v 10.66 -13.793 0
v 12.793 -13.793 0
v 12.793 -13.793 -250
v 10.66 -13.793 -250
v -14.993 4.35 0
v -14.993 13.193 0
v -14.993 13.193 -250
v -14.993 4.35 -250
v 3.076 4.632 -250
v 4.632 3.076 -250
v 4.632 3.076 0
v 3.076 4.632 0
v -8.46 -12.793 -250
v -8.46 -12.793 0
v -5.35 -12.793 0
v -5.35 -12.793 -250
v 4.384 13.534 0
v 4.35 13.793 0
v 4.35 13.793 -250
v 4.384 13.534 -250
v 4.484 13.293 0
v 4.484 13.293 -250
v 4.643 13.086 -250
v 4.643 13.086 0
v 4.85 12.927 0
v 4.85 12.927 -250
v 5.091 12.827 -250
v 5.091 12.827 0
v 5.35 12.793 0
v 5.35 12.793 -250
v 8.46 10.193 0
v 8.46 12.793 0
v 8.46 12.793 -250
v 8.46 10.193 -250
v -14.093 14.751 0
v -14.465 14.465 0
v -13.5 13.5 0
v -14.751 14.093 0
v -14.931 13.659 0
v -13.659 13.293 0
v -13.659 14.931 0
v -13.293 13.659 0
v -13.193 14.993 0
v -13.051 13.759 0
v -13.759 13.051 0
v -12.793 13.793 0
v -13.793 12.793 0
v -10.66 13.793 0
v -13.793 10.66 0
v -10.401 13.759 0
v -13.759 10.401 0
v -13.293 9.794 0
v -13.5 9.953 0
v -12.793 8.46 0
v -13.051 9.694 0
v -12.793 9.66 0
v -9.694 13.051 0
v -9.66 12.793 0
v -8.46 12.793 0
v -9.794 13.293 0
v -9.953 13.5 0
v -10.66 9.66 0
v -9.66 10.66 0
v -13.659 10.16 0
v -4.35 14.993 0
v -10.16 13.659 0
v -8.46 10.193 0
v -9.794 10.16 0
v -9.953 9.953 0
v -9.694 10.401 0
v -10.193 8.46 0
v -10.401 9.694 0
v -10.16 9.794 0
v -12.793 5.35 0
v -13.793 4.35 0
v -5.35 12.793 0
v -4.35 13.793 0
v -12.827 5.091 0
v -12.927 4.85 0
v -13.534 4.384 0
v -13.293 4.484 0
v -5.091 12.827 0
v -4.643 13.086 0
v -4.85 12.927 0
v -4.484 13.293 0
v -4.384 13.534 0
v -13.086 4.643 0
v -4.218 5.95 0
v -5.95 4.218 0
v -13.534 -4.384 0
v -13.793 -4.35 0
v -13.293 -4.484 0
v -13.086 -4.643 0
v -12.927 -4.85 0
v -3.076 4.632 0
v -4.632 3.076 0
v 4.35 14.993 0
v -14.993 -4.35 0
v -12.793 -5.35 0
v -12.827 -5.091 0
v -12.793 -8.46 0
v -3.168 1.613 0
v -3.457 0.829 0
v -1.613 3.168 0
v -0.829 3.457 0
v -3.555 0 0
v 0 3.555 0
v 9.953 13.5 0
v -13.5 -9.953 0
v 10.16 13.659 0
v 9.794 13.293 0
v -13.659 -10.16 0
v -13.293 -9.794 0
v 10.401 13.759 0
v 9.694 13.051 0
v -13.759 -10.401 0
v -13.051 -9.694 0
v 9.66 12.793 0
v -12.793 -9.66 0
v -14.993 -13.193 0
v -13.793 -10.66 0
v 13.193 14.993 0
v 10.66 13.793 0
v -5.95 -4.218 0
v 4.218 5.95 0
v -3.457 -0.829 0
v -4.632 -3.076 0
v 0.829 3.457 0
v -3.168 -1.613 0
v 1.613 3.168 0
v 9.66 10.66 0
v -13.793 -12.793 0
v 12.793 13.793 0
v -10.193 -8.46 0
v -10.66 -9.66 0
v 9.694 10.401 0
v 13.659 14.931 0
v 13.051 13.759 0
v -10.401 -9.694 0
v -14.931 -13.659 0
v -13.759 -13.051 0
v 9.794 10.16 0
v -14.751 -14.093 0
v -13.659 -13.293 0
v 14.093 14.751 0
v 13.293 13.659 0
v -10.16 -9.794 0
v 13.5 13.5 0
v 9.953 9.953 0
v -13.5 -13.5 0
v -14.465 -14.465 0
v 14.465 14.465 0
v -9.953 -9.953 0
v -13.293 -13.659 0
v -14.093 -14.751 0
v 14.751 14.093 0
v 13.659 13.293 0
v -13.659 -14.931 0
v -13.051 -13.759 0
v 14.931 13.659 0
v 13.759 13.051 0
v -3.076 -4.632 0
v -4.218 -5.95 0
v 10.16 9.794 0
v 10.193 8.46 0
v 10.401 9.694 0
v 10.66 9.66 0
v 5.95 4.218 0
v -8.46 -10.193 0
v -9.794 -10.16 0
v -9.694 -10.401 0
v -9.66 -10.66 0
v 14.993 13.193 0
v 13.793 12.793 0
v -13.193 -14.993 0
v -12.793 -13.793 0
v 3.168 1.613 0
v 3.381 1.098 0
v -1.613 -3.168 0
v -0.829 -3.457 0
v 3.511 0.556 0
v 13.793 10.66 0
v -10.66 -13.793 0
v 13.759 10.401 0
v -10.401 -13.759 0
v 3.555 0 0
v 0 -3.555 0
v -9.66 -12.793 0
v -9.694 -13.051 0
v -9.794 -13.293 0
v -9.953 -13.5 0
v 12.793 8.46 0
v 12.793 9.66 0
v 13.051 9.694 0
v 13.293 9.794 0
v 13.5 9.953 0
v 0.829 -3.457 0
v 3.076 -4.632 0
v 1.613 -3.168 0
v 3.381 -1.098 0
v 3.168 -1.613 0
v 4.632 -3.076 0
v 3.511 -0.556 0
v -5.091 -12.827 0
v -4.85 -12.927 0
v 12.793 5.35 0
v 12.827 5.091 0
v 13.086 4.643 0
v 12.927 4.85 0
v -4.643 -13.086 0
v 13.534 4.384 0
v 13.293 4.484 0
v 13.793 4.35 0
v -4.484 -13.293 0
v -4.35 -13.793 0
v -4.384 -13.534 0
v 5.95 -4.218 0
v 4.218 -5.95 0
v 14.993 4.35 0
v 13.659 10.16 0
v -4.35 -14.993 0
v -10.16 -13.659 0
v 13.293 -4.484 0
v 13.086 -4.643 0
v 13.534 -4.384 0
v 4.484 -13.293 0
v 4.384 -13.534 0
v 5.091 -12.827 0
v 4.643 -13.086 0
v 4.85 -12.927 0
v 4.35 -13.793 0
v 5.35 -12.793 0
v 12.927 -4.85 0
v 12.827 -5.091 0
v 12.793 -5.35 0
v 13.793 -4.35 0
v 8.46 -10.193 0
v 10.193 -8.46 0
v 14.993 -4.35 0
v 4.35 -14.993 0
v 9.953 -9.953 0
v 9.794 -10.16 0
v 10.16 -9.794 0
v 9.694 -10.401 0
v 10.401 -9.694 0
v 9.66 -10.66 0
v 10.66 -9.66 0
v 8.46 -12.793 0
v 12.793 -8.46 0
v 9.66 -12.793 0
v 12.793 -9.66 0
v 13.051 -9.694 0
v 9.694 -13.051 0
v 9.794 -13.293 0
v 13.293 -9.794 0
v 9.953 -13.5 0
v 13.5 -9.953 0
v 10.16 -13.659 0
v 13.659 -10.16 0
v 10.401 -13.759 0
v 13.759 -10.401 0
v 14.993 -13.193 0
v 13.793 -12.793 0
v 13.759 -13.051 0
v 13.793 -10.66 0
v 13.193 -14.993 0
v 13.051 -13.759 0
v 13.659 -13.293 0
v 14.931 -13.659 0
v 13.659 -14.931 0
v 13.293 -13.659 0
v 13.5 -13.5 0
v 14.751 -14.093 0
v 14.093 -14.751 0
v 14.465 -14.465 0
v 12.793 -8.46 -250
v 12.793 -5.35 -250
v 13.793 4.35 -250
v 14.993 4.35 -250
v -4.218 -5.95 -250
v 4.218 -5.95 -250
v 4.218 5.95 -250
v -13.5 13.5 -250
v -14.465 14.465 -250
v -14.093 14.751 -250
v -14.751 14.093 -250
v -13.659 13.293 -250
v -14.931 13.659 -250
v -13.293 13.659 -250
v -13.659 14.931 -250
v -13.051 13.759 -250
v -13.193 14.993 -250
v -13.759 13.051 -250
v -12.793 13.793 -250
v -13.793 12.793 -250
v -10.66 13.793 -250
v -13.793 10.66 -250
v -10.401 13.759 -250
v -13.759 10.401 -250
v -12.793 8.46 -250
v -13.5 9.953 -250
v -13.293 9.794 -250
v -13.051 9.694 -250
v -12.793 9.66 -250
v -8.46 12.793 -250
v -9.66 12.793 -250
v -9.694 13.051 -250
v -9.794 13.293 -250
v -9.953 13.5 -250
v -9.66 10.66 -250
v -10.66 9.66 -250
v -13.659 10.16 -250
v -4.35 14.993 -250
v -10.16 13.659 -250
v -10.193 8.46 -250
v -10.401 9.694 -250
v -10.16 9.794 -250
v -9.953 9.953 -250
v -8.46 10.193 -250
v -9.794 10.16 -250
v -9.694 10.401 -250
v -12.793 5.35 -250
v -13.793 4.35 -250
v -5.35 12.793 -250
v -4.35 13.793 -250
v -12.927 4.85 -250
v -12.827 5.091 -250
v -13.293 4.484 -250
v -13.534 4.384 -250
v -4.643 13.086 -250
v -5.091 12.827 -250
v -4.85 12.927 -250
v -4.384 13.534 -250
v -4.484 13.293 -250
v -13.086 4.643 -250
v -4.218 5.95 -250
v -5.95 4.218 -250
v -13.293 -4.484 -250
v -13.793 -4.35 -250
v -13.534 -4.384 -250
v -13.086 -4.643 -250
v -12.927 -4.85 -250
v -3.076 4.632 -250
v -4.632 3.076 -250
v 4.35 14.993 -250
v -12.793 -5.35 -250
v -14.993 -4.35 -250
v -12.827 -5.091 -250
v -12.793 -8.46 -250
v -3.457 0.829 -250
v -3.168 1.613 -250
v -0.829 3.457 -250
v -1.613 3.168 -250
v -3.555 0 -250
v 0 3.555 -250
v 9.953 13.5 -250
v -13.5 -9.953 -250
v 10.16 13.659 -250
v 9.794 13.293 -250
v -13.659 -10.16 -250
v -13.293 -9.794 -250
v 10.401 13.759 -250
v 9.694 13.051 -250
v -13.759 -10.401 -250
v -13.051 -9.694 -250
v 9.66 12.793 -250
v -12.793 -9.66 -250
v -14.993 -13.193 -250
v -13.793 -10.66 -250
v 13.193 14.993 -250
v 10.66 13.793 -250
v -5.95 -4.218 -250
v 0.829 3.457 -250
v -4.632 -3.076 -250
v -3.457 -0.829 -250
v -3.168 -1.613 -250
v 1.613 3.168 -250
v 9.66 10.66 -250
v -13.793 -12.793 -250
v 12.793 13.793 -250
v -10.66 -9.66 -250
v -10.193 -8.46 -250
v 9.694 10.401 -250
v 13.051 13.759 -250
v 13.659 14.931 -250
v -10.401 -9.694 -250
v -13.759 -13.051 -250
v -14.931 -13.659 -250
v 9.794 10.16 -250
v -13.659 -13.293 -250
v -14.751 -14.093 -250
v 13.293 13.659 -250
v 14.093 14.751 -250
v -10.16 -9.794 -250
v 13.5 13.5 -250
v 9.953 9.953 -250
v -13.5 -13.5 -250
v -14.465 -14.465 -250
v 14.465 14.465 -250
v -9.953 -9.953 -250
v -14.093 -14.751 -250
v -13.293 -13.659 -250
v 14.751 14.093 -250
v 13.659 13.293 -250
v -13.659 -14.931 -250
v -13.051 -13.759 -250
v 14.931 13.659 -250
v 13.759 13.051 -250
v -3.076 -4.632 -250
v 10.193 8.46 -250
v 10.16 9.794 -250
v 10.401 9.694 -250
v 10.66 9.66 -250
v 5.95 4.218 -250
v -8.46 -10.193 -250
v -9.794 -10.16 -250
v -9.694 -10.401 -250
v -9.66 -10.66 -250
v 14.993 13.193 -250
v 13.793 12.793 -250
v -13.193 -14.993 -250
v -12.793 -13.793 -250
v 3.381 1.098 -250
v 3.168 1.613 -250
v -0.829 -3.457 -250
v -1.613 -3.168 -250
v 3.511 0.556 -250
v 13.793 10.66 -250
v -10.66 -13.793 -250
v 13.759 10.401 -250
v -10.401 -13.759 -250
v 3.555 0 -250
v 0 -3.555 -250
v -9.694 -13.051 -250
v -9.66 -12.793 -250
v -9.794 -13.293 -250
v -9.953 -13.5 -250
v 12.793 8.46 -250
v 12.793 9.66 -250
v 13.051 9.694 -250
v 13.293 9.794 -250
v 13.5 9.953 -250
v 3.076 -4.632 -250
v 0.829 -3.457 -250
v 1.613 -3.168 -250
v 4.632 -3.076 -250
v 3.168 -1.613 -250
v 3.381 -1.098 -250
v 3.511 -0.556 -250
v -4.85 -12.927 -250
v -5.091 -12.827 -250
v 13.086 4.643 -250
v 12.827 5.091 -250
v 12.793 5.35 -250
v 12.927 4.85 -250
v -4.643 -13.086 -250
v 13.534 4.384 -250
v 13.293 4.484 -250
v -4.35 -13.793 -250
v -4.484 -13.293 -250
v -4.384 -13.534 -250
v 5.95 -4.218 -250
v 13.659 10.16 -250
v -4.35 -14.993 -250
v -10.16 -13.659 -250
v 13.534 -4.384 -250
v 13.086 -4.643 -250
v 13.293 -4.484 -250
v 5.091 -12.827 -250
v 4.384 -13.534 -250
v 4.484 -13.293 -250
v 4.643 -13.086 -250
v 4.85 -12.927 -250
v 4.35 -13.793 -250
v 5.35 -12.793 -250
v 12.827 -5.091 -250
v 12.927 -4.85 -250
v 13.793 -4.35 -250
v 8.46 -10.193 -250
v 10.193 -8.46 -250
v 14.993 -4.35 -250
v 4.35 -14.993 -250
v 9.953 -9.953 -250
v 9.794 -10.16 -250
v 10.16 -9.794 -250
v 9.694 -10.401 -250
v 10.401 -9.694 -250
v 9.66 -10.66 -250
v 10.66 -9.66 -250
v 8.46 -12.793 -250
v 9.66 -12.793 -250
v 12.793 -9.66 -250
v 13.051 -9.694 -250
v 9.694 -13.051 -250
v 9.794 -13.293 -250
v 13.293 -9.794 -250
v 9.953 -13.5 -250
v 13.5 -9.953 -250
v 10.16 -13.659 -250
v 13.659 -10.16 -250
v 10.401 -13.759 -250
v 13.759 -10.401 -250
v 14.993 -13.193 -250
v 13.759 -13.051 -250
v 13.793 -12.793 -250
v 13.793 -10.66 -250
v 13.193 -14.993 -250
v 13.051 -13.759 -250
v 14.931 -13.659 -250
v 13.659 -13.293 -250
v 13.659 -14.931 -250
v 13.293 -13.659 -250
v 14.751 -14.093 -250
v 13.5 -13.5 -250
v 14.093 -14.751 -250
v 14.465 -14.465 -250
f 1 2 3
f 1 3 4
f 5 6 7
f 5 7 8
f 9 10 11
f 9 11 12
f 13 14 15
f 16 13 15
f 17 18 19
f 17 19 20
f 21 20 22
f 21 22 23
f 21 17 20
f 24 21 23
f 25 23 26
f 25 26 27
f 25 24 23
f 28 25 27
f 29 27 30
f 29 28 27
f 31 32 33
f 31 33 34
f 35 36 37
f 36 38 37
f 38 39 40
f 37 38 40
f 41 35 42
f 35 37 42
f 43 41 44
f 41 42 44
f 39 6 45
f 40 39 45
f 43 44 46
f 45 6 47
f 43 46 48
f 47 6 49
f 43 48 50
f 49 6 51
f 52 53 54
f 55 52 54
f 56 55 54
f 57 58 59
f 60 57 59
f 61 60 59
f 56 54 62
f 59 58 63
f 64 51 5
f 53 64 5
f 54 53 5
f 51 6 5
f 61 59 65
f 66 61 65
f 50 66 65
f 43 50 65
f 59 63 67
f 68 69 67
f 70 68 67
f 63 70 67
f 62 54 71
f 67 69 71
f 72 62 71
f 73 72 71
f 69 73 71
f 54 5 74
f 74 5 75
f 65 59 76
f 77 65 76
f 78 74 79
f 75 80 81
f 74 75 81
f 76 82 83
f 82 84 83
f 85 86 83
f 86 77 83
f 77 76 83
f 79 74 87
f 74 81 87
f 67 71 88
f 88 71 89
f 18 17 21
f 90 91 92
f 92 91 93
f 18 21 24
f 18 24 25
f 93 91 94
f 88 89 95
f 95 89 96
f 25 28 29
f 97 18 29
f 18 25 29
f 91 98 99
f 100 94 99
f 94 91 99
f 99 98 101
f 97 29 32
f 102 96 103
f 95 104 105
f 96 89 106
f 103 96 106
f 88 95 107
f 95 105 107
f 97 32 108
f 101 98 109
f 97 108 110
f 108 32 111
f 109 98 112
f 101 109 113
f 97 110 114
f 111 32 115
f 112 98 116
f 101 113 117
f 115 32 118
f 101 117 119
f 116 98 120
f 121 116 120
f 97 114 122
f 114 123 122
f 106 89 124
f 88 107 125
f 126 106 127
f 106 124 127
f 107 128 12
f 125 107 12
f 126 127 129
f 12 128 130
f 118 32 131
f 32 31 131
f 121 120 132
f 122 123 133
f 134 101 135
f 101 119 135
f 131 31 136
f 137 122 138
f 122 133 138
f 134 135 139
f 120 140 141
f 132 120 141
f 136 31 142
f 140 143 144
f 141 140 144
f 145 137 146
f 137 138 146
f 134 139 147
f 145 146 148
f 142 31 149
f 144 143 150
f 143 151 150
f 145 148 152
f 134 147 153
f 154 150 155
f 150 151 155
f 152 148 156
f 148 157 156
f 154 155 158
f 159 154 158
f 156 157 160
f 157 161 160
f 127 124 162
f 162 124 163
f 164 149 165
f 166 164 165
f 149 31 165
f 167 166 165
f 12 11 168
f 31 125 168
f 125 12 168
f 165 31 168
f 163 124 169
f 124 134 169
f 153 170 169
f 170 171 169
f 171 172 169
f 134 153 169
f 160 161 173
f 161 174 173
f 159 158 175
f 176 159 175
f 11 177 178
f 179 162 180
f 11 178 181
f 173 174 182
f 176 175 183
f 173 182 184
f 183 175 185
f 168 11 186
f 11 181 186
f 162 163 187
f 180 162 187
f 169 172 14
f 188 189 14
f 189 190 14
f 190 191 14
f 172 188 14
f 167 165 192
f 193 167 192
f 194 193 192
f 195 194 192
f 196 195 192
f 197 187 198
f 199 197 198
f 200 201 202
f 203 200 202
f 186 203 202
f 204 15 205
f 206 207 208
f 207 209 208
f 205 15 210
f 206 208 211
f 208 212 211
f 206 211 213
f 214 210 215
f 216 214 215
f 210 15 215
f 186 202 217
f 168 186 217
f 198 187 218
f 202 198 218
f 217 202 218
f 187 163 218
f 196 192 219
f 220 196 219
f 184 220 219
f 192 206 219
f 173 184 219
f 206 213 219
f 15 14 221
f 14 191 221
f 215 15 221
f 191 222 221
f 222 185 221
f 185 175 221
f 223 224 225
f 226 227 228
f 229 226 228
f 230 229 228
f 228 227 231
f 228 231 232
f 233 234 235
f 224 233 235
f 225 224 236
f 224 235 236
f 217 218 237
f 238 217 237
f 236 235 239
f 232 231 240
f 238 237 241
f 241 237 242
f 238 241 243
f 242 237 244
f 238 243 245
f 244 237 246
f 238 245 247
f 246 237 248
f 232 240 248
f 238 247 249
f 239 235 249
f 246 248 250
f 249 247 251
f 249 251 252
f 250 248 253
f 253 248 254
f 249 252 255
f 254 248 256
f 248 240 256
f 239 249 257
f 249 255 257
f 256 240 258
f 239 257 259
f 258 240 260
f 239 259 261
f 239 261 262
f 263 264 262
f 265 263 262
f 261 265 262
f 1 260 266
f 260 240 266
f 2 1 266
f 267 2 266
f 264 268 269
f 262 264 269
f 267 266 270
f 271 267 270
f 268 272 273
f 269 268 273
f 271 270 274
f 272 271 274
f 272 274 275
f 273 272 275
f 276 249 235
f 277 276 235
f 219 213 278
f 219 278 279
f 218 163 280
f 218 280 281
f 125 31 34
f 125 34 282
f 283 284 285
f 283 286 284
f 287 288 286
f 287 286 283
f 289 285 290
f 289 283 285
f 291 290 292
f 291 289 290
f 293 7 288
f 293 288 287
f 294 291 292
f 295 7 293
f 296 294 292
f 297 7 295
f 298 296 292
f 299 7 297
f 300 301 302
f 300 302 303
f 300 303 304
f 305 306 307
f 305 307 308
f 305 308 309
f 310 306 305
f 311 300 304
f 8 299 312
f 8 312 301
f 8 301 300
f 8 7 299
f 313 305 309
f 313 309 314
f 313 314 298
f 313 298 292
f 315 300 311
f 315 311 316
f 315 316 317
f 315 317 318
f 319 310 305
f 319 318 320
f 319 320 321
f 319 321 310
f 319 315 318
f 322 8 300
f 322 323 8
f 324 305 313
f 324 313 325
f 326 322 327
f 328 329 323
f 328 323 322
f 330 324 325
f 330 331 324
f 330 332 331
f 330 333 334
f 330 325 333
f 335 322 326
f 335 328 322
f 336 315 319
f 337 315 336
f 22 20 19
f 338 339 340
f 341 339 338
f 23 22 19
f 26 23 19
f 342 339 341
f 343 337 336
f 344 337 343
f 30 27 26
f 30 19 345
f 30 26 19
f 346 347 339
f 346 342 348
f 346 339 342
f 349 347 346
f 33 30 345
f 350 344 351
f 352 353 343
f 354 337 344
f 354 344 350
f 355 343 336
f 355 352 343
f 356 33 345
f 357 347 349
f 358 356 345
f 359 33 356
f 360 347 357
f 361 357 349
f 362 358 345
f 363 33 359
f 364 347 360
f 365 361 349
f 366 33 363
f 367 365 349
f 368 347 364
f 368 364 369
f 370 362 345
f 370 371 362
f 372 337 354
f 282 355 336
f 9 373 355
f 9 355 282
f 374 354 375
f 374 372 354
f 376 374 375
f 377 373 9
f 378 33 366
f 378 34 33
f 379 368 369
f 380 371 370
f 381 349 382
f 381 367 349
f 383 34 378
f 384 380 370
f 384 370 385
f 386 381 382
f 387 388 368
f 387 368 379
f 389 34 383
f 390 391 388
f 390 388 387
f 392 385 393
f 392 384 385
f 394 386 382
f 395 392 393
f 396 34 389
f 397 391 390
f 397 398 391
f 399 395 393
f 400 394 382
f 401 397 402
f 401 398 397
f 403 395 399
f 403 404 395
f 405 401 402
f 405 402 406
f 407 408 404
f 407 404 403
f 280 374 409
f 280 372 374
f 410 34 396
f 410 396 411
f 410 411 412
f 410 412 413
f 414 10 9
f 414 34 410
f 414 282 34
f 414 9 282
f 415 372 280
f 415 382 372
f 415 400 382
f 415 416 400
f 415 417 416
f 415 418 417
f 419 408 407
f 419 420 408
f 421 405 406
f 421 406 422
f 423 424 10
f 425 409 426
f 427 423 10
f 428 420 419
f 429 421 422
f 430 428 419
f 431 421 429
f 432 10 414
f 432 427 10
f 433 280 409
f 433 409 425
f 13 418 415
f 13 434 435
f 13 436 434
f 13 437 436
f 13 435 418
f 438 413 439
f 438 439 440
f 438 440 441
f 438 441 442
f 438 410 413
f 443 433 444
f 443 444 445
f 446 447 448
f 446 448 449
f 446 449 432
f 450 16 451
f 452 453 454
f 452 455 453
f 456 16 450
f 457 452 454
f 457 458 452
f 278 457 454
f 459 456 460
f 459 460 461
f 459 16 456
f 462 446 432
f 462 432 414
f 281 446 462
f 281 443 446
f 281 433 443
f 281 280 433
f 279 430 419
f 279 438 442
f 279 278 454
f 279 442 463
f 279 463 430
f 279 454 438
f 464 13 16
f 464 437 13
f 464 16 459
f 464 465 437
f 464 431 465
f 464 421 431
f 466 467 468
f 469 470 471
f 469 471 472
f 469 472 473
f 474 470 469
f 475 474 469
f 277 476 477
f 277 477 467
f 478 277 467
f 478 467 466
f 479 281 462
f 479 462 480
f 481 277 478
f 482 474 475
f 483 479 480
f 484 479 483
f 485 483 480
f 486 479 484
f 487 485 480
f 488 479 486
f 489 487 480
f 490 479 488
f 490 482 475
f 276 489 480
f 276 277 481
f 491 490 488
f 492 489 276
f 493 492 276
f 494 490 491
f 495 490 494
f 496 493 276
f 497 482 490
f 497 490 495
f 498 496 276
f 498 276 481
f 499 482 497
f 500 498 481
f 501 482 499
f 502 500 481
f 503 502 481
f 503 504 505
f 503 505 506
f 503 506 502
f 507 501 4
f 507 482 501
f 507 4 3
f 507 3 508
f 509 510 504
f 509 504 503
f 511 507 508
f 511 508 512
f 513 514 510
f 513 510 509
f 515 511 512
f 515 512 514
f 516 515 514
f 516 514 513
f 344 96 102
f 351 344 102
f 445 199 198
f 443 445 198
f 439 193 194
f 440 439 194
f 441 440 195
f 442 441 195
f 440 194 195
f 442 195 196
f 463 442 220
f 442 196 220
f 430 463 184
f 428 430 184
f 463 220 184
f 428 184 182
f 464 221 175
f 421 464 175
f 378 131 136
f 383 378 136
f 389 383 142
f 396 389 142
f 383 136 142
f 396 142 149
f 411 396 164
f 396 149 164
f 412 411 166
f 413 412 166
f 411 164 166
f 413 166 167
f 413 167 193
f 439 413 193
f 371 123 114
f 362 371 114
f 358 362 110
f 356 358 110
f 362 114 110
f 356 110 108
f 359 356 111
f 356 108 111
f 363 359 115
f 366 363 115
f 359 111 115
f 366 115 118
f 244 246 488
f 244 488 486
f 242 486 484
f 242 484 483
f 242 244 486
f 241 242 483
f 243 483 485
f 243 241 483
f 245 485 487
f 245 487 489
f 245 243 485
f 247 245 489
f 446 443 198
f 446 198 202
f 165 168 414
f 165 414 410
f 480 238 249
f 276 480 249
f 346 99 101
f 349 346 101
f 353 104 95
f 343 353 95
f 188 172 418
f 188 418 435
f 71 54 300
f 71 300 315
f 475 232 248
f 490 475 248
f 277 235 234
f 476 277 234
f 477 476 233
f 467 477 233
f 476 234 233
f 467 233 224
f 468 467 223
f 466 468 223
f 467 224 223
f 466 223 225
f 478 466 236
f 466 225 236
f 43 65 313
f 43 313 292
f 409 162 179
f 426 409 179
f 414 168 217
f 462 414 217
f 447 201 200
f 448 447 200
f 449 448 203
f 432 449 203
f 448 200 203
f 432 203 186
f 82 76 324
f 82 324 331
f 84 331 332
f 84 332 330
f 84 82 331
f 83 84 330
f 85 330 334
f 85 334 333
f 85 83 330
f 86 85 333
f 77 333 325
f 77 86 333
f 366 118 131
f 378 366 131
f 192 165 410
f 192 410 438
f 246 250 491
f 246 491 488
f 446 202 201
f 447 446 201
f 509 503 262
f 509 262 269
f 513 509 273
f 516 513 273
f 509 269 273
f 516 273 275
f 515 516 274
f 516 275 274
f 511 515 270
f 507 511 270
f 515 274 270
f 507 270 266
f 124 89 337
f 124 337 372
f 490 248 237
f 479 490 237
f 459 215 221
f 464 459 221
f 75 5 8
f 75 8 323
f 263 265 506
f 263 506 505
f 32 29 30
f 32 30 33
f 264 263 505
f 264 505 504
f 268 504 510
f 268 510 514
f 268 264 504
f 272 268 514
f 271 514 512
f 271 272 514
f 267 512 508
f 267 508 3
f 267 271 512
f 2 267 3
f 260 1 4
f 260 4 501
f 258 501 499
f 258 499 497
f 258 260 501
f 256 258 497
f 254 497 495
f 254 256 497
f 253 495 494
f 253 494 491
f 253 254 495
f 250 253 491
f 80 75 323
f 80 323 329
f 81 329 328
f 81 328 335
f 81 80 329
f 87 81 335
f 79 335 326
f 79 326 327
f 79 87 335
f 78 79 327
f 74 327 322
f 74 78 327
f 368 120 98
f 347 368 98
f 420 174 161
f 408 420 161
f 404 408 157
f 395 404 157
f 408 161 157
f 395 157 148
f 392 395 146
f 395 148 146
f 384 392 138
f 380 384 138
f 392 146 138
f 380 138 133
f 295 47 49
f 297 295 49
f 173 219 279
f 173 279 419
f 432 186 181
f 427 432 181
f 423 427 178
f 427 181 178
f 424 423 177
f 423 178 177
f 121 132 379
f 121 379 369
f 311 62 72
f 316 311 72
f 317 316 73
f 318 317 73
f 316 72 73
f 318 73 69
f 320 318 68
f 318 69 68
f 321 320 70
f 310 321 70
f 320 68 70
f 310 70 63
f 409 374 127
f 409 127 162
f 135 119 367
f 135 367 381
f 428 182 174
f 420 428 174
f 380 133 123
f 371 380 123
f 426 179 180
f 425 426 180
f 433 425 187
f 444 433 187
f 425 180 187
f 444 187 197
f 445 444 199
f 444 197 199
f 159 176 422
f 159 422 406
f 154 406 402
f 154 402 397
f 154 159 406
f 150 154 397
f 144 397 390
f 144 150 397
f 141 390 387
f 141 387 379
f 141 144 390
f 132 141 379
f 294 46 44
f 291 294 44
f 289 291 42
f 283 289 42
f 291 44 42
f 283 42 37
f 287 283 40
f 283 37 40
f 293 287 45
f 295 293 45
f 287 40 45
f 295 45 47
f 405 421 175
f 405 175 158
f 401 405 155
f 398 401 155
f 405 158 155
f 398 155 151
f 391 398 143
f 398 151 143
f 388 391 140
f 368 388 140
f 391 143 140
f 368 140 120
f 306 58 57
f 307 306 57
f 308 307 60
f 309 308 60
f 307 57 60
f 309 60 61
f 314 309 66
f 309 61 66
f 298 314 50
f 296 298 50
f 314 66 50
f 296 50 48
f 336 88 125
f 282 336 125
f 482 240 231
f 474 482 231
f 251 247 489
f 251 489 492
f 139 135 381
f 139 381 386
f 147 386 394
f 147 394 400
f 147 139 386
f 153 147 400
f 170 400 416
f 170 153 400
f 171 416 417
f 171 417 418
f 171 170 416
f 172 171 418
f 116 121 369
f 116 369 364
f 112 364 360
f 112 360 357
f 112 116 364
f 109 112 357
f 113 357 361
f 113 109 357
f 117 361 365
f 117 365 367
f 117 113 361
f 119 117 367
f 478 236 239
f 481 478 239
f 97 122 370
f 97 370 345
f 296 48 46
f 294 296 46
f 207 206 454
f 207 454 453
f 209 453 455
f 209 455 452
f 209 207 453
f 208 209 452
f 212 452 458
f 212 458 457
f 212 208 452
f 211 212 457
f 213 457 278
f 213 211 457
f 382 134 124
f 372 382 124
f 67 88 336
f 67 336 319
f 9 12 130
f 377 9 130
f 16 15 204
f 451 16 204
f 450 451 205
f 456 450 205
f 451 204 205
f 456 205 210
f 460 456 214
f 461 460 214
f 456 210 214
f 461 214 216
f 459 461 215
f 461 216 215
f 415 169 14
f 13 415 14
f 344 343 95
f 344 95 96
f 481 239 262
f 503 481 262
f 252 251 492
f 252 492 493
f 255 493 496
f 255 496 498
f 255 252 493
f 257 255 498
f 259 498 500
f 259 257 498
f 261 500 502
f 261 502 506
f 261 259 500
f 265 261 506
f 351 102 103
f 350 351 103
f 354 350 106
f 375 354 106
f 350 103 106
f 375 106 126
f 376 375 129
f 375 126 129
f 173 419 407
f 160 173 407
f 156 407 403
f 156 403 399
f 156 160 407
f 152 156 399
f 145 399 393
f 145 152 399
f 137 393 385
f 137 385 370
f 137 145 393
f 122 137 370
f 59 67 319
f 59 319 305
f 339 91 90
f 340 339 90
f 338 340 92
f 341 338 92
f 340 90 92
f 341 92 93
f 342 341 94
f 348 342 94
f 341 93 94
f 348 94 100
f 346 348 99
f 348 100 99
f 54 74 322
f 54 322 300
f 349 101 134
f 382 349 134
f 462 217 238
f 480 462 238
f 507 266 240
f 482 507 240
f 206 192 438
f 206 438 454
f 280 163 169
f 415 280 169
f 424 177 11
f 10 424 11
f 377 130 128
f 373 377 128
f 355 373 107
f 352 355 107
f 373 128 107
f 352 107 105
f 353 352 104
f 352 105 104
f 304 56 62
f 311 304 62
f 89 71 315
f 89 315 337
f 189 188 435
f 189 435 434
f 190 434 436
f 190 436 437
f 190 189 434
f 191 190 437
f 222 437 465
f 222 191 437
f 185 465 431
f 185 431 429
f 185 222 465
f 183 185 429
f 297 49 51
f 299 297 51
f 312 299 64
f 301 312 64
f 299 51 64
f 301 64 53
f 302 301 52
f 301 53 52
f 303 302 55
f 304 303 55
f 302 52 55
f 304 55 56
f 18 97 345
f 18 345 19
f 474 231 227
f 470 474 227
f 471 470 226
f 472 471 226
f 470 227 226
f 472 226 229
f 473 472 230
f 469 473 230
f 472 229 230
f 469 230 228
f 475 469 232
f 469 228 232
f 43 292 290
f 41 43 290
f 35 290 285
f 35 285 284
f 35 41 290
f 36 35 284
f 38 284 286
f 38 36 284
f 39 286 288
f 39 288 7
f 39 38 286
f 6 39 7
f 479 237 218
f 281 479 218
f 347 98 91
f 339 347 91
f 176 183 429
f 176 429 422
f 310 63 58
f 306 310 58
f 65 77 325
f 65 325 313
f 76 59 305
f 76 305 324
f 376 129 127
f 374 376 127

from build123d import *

# Parameters (mm, degrees)
SKETCH1_W           = 11.9
SKETCH1_H           = 5.95
BOSS_EXTRUDE1_DEPTH = 250
CUT_EXTRUDE1_DEPTH  = 251


with BuildPart() as part:
    # Sketch1 → Boss-Extrude1 (new body)
    with BuildSketch(Plane.XY):
        with BuildLine():
            Line((-4.350229073, 14.992640687), (-13.192640687, 14.992640687))
            ThreePointArc((-13.192640687, 14.992640687), (-14.465432893, 14.465432893), (-14.992640687, 13.192640687))
            Line((-14.992640687, 13.192640687), (-14.992640687, 4.350229073))
            Line((-14.992640687, 4.350229073), (-13.792640687, 4.350229073))
            ThreePointArc((-13.792640687, 4.350229073), (-13.085533906, 4.643122292), (-12.792640687, 5.350229073))
            Line((-12.792640687, 5.350229073), (-12.792640687, 8.460229073))
            Line((-12.792640687, 8.460229073), (-8.460229073, 8.460229073))
            Line((-8.460229073, 8.460229073), (-8.460229073, 12.792640687))
            Line((-8.460229073, 12.792640687), (-5.350229073, 12.792640687))
            ThreePointArc((-5.350229073, 12.792640687), (-4.643122292, 13.085533906), (-4.350229073, 13.792640687))
            Line((-4.350229073, 13.792640687), (-4.350229073, 14.992640687))
        make_face()
        with BuildLine():
            Line((-10.660229073, 13.792640687), (-12.792640687, 13.792640687))
            ThreePointArc((-12.792640687, 13.792640687), (-13.499747468, 13.499747468), (-13.792640687, 12.792640687))
            Line((-13.792640687, 12.792640687), (-13.792640687, 10.660229073))
            ThreePointArc((-13.792640687, 10.660229073), (-13.499747468, 9.953122292), (-12.792640687, 9.660229073))
            Line((-12.792640687, 9.660229073), (-10.660229073, 9.660229073))
            ThreePointArc((-10.660229073, 9.660229073), (-9.953122292, 9.953122292), (-9.660229073, 10.660229073))
            Line((-9.660229073, 10.660229073), (-9.660229073, 12.792640687))
            ThreePointArc((-9.660229073, 12.792640687), (-9.953122292, 13.499747468), (-10.660229073, 13.792640687))
        make_face(mode=Mode.SUBTRACT)
        Polygon((-5.95, 4.217588386), (-5.95, 5.95), (-4.217588386, 5.95), (-8.460229073, 10.192640687), (-8.460229073, 8.460229073), (-10.192640687, 8.460229073), align=None)
        with Locations((0, 2.975)):
            Rectangle(SKETCH1_W, SKETCH1_H)
        Polygon((8.460229073, 10.192640687), (4.217588386, 5.95), (5.95, 5.95), (5.95, 4.217588386), (10.192640687, 8.460229073), (8.460229073, 8.460229073), align=None)
        with BuildLine():
            Line((12.792640687, 8.460229073), (12.792640687, 5.350229073))
            ThreePointArc((12.792640687, 5.350229073), (13.085533906, 4.643122292), (13.792640687, 4.350229073))
            Line((13.792640687, 4.350229073), (14.992640687, 4.350229073))
            Line((14.992640687, 4.350229073), (14.992640687, 13.192640687))
            ThreePointArc((14.992640687, 13.192640687), (14.465432893, 14.465432893), (13.192640687, 14.992640687))
            Line((13.192640687, 14.992640687), (4.350229073, 14.992640687))
            Line((4.350229073, 14.992640687), (4.350229073, 13.792640687))
            ThreePointArc((4.350229073, 13.792640687), (4.643122292, 13.085533906), (5.350229073, 12.792640687))
            Line((5.350229073, 12.792640687), (8.460229073, 12.792640687))
            Line((8.460229073, 12.792640687), (8.460229073, 8.460229073))
            Line((8.460229073, 8.460229073), (12.792640687, 8.460229073))
        make_face()
        with BuildLine():
            ThreePointArc((9.660229073, 10.660229073), (9.953122292, 9.953122292), (10.660229073, 9.660229073))
            Line((10.660229073, 9.660229073), (12.792640687, 9.660229073))
            ThreePointArc((12.792640687, 9.660229073), (13.499747468, 9.953122292), (13.792640687, 10.660229073))
            Line((13.792640687, 10.660229073), (13.792640687, 12.792640687))
            ThreePointArc((13.792640687, 12.792640687), (13.499747468, 13.499747468), (12.792640687, 13.792640687))
            Line((12.792640687, 13.792640687), (10.660229073, 13.792640687))
            ThreePointArc((10.660229073, 13.792640687), (9.953122292, 13.499747468), (9.660229073, 12.792640687))
            Line((9.660229073, 12.792640687), (9.660229073, 10.660229073))
        make_face(mode=Mode.SUBTRACT)
    extrude(amount=-BOSS_EXTRUDE1_DEPTH)

    # Mirror1: part across plane


with BuildPart() as part_1:
    add(part.part)
    add(part.part.mirror(Plane(origin=(0, 0, -250), x_dir=(0, 0, 1), z_dir=(0, -1, 0))))

    # Sketch2 → Cut-Extrude1 (cut, through all)
    with BuildSketch(Plane.XY):
        with BuildLine():
            Line((-4.631549417, 3.075914498), (-3.16821753, 1.612582612))
            ThreePointArc((-3.16821753, 1.612582612), (-2.513764607, 2.513764607), (-1.612582612, 3.16821753))
            Line((-1.612582612, 3.16821753), (-3.075914498, 4.631549417))
            Line((-3.075914498, 4.631549417), (-4.631549417, 3.075914498))
        make_face()
        with BuildLine():
            Line((-3.16821753, 1.612582612), (-1.555634919, 0))
            Line((-1.555634919, 0), (0, 1.555634919))
            Line((0, 1.555634919), (-1.612582612, 3.16821753))
            ThreePointArc((-1.612582612, 3.16821753), (-2.513764607, 2.513764607), (-3.16821753, 1.612582612))
        make_face()
        with BuildLine():
            ThreePointArc((-3.16821753, 1.612582612), (-3.555, 0), (-3.16821753, -1.612582612))
            Line((-3.16821753, -1.612582612), (-1.555634919, 0))
            Line((-1.555634919, 0), (-3.16821753, 1.612582612))
        make_face()
        with BuildLine():
            Line((-4.631549417, -3.075914498), (-3.075914498, -4.631549417))
            Line((-3.075914498, -4.631549417), (-1.612582612, -3.16821753))
            ThreePointArc((-1.612582612, -3.16821753), (-2.513764607, -2.513764607), (-3.16821753, -1.612582612))
            Line((-3.16821753, -1.612582612), (-4.631549417, -3.075914498))
        make_face()
        with BuildLine():
            ThreePointArc((-3.16821753, -1.612582612), (-2.513764607, -2.513764607), (-1.612582612, -3.16821753))
            Line((-1.612582612, -3.16821753), (0, -1.555634919))
            Line((0, -1.555634919), (-1.555634919, 0))
            Line((-1.555634919, 0), (-3.16821753, -1.612582612))
        make_face()
        with BuildLine():
            Line((0, -1.555634919), (-1.612582612, -3.16821753))
            ThreePointArc((-1.612582612, -3.16821753), (0, -3.555), (1.612582612, -3.16821753))
            Line((1.612582612, -3.16821753), (0, -1.555634919))
        make_face()
        with BuildLine():
            Line((1.555634919, 0), (0, -1.555634919))
            Line((0, -1.555634919), (1.612582612, -3.16821753))
            ThreePointArc((1.612582612, -3.16821753), (2.513764607, -2.513764607), (3.16821753, -1.612582612))
            Line((3.16821753, -1.612582612), (1.555634919, 0))
        make_face()
        with BuildLine():
            Line((3.16821753, 1.612582612), (1.555634919, 0))
            Line((1.555634919, 0), (3.16821753, -1.612582612))
            ThreePointArc((3.16821753, -1.612582612), (3.456952294, -0.829159719), (3.555, 0))
            ThreePointArc((3.555, 0), (3.456952294, 0.829159719), (3.16821753, 1.612582612))
        make_face()
        Polygon((-1.555634919, 0), (0, -1.555634919), (1.555634919, 0), (0, 1.555634919), align=None)
        with BuildLine():
            Line((0, 1.555634919), (1.555634919, 0))
            Line((1.555634919, 0), (3.16821753, 1.612582612))
            ThreePointArc((3.16821753, 1.612582612), (2.513764607, 2.513764607), (1.612582612, 3.16821753))
            Line((1.612582612, 3.16821753), (0, 1.555634919))
        make_face()
        with BuildLine():
            Line((-1.612582612, 3.16821753), (0, 1.555634919))
            Line((0, 1.555634919), (1.612582612, 3.16821753))
            ThreePointArc((1.612582612, 3.16821753), (0, 3.555), (-1.612582612, 3.16821753))
        make_face()
        with BuildLine():
            ThreePointArc((1.612582612, 3.16821753), (2.513764607, 2.513764607), (3.16821753, 1.612582612))
            Line((3.16821753, 1.612582612), (4.631549417, 3.075914498))
            Line((4.631549417, 3.075914498), (3.075914498, 4.631549417))
            Line((3.075914498, 4.631549417), (1.612582612, 3.16821753))
        make_face()
        with BuildLine():
            ThreePointArc((3.16821753, -1.612582612), (2.513764607, -2.513764607), (1.612582612, -3.16821753))
            Line((1.612582612, -3.16821753), (3.075914498, -4.631549417))
            Line((3.075914498, -4.631549417), (4.631549417, -3.075914498))
            Line((4.631549417, -3.075914498), (3.16821753, -1.612582612))
        make_face()
    extrude(amount=-CUT_EXTRUDE1_DEPTH, mode=Mode.SUBTRACT)


solid = part_1.part
